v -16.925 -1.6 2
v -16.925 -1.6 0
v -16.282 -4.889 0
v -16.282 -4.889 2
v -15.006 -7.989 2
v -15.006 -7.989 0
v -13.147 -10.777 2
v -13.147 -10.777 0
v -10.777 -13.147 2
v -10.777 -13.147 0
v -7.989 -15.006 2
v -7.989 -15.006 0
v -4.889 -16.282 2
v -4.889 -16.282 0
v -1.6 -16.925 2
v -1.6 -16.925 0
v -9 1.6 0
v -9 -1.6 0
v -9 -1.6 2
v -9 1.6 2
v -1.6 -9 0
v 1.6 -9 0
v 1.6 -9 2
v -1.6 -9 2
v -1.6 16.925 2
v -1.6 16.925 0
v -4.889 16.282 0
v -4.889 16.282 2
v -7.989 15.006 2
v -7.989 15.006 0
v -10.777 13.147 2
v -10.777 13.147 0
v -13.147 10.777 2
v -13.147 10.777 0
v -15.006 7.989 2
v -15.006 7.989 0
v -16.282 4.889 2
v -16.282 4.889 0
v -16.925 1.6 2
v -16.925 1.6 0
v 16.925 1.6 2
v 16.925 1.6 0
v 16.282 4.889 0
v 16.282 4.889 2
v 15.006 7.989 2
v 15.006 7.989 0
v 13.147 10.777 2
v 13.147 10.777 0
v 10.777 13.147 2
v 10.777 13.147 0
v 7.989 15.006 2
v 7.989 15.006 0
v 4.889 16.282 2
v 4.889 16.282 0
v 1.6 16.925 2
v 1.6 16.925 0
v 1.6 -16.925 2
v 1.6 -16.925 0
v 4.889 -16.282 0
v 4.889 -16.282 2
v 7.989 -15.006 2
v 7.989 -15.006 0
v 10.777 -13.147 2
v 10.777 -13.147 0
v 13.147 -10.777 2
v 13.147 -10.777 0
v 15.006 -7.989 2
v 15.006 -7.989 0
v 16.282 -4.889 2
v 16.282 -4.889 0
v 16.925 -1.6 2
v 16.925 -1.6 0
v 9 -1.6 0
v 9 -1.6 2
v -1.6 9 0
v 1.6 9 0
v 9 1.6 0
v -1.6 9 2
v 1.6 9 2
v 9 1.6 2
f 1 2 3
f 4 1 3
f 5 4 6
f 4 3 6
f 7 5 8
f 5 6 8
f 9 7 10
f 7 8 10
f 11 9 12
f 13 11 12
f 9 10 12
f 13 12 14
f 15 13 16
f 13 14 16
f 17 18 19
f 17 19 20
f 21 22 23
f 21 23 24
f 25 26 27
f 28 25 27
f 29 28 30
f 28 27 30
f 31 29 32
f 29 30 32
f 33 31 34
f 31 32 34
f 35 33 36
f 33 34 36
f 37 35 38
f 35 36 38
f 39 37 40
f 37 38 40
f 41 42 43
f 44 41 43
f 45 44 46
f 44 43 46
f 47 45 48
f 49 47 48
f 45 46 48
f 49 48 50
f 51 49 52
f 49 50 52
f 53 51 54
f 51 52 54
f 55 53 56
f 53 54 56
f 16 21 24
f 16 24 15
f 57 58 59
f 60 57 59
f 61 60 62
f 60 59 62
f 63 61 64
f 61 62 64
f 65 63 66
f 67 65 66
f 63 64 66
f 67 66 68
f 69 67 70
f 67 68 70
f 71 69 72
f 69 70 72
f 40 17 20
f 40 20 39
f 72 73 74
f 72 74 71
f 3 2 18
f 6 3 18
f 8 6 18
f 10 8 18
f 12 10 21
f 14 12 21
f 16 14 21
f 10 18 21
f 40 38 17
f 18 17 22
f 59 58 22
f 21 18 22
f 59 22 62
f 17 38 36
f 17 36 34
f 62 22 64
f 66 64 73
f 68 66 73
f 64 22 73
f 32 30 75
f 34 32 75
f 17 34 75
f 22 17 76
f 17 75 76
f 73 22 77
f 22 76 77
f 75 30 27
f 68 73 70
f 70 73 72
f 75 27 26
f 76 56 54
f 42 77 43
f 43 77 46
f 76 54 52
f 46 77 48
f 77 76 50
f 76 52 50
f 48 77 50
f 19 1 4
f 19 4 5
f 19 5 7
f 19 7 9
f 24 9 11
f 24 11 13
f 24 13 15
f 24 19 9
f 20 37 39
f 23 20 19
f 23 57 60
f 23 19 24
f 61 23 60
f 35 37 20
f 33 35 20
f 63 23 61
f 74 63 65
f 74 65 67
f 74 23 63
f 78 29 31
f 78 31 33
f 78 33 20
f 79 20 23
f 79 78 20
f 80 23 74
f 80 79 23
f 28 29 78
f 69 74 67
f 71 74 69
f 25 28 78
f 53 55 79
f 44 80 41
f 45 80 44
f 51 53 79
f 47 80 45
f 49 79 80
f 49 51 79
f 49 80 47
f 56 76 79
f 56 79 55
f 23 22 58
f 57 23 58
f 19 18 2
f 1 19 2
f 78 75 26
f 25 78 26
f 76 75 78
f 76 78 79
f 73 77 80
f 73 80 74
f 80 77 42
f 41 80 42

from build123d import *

# Parameters (mm, degrees)
BOX_W          = 3.2
BOX_H          = 10
BOX_DEPTH      = 4
ARRAY_COUNT    = 4
CYLINDER_R     = 17
CYLINDER_DEPTH = 2


with BuildPart() as array:
    # Box → Box (new body)
    with BuildSketch(Plane(origin=(-1.6, 9, -1), x_dir=(1, 0, 0), z_dir=(0, 0, 1))):
        with Locations((1.6, 5)):
            Rectangle(BOX_W, BOX_H)
    extrude(amount=BOX_DEPTH)

    # Array: Array ×4 about axis
    array_axis = Axis((0, 0, 0), (0, 0, 1))


with BuildPart() as array_1:
    add(array.part)
    for i in range(1, ARRAY_COUNT):
        add(array.part.rotate(array_axis, i * 360 / ARRAY_COUNT))


with BuildPart() as cut:
    # Cylinder → Cylinder (new body)
    with BuildSketch(Plane.XY):
        Circle(CYLINDER_R)
    extrude(amount=CYLINDER_DEPTH)

    # Cut: cut Array
    add(array_1.part, mode=Mode.SUBTRACT)


solid = cut.part
